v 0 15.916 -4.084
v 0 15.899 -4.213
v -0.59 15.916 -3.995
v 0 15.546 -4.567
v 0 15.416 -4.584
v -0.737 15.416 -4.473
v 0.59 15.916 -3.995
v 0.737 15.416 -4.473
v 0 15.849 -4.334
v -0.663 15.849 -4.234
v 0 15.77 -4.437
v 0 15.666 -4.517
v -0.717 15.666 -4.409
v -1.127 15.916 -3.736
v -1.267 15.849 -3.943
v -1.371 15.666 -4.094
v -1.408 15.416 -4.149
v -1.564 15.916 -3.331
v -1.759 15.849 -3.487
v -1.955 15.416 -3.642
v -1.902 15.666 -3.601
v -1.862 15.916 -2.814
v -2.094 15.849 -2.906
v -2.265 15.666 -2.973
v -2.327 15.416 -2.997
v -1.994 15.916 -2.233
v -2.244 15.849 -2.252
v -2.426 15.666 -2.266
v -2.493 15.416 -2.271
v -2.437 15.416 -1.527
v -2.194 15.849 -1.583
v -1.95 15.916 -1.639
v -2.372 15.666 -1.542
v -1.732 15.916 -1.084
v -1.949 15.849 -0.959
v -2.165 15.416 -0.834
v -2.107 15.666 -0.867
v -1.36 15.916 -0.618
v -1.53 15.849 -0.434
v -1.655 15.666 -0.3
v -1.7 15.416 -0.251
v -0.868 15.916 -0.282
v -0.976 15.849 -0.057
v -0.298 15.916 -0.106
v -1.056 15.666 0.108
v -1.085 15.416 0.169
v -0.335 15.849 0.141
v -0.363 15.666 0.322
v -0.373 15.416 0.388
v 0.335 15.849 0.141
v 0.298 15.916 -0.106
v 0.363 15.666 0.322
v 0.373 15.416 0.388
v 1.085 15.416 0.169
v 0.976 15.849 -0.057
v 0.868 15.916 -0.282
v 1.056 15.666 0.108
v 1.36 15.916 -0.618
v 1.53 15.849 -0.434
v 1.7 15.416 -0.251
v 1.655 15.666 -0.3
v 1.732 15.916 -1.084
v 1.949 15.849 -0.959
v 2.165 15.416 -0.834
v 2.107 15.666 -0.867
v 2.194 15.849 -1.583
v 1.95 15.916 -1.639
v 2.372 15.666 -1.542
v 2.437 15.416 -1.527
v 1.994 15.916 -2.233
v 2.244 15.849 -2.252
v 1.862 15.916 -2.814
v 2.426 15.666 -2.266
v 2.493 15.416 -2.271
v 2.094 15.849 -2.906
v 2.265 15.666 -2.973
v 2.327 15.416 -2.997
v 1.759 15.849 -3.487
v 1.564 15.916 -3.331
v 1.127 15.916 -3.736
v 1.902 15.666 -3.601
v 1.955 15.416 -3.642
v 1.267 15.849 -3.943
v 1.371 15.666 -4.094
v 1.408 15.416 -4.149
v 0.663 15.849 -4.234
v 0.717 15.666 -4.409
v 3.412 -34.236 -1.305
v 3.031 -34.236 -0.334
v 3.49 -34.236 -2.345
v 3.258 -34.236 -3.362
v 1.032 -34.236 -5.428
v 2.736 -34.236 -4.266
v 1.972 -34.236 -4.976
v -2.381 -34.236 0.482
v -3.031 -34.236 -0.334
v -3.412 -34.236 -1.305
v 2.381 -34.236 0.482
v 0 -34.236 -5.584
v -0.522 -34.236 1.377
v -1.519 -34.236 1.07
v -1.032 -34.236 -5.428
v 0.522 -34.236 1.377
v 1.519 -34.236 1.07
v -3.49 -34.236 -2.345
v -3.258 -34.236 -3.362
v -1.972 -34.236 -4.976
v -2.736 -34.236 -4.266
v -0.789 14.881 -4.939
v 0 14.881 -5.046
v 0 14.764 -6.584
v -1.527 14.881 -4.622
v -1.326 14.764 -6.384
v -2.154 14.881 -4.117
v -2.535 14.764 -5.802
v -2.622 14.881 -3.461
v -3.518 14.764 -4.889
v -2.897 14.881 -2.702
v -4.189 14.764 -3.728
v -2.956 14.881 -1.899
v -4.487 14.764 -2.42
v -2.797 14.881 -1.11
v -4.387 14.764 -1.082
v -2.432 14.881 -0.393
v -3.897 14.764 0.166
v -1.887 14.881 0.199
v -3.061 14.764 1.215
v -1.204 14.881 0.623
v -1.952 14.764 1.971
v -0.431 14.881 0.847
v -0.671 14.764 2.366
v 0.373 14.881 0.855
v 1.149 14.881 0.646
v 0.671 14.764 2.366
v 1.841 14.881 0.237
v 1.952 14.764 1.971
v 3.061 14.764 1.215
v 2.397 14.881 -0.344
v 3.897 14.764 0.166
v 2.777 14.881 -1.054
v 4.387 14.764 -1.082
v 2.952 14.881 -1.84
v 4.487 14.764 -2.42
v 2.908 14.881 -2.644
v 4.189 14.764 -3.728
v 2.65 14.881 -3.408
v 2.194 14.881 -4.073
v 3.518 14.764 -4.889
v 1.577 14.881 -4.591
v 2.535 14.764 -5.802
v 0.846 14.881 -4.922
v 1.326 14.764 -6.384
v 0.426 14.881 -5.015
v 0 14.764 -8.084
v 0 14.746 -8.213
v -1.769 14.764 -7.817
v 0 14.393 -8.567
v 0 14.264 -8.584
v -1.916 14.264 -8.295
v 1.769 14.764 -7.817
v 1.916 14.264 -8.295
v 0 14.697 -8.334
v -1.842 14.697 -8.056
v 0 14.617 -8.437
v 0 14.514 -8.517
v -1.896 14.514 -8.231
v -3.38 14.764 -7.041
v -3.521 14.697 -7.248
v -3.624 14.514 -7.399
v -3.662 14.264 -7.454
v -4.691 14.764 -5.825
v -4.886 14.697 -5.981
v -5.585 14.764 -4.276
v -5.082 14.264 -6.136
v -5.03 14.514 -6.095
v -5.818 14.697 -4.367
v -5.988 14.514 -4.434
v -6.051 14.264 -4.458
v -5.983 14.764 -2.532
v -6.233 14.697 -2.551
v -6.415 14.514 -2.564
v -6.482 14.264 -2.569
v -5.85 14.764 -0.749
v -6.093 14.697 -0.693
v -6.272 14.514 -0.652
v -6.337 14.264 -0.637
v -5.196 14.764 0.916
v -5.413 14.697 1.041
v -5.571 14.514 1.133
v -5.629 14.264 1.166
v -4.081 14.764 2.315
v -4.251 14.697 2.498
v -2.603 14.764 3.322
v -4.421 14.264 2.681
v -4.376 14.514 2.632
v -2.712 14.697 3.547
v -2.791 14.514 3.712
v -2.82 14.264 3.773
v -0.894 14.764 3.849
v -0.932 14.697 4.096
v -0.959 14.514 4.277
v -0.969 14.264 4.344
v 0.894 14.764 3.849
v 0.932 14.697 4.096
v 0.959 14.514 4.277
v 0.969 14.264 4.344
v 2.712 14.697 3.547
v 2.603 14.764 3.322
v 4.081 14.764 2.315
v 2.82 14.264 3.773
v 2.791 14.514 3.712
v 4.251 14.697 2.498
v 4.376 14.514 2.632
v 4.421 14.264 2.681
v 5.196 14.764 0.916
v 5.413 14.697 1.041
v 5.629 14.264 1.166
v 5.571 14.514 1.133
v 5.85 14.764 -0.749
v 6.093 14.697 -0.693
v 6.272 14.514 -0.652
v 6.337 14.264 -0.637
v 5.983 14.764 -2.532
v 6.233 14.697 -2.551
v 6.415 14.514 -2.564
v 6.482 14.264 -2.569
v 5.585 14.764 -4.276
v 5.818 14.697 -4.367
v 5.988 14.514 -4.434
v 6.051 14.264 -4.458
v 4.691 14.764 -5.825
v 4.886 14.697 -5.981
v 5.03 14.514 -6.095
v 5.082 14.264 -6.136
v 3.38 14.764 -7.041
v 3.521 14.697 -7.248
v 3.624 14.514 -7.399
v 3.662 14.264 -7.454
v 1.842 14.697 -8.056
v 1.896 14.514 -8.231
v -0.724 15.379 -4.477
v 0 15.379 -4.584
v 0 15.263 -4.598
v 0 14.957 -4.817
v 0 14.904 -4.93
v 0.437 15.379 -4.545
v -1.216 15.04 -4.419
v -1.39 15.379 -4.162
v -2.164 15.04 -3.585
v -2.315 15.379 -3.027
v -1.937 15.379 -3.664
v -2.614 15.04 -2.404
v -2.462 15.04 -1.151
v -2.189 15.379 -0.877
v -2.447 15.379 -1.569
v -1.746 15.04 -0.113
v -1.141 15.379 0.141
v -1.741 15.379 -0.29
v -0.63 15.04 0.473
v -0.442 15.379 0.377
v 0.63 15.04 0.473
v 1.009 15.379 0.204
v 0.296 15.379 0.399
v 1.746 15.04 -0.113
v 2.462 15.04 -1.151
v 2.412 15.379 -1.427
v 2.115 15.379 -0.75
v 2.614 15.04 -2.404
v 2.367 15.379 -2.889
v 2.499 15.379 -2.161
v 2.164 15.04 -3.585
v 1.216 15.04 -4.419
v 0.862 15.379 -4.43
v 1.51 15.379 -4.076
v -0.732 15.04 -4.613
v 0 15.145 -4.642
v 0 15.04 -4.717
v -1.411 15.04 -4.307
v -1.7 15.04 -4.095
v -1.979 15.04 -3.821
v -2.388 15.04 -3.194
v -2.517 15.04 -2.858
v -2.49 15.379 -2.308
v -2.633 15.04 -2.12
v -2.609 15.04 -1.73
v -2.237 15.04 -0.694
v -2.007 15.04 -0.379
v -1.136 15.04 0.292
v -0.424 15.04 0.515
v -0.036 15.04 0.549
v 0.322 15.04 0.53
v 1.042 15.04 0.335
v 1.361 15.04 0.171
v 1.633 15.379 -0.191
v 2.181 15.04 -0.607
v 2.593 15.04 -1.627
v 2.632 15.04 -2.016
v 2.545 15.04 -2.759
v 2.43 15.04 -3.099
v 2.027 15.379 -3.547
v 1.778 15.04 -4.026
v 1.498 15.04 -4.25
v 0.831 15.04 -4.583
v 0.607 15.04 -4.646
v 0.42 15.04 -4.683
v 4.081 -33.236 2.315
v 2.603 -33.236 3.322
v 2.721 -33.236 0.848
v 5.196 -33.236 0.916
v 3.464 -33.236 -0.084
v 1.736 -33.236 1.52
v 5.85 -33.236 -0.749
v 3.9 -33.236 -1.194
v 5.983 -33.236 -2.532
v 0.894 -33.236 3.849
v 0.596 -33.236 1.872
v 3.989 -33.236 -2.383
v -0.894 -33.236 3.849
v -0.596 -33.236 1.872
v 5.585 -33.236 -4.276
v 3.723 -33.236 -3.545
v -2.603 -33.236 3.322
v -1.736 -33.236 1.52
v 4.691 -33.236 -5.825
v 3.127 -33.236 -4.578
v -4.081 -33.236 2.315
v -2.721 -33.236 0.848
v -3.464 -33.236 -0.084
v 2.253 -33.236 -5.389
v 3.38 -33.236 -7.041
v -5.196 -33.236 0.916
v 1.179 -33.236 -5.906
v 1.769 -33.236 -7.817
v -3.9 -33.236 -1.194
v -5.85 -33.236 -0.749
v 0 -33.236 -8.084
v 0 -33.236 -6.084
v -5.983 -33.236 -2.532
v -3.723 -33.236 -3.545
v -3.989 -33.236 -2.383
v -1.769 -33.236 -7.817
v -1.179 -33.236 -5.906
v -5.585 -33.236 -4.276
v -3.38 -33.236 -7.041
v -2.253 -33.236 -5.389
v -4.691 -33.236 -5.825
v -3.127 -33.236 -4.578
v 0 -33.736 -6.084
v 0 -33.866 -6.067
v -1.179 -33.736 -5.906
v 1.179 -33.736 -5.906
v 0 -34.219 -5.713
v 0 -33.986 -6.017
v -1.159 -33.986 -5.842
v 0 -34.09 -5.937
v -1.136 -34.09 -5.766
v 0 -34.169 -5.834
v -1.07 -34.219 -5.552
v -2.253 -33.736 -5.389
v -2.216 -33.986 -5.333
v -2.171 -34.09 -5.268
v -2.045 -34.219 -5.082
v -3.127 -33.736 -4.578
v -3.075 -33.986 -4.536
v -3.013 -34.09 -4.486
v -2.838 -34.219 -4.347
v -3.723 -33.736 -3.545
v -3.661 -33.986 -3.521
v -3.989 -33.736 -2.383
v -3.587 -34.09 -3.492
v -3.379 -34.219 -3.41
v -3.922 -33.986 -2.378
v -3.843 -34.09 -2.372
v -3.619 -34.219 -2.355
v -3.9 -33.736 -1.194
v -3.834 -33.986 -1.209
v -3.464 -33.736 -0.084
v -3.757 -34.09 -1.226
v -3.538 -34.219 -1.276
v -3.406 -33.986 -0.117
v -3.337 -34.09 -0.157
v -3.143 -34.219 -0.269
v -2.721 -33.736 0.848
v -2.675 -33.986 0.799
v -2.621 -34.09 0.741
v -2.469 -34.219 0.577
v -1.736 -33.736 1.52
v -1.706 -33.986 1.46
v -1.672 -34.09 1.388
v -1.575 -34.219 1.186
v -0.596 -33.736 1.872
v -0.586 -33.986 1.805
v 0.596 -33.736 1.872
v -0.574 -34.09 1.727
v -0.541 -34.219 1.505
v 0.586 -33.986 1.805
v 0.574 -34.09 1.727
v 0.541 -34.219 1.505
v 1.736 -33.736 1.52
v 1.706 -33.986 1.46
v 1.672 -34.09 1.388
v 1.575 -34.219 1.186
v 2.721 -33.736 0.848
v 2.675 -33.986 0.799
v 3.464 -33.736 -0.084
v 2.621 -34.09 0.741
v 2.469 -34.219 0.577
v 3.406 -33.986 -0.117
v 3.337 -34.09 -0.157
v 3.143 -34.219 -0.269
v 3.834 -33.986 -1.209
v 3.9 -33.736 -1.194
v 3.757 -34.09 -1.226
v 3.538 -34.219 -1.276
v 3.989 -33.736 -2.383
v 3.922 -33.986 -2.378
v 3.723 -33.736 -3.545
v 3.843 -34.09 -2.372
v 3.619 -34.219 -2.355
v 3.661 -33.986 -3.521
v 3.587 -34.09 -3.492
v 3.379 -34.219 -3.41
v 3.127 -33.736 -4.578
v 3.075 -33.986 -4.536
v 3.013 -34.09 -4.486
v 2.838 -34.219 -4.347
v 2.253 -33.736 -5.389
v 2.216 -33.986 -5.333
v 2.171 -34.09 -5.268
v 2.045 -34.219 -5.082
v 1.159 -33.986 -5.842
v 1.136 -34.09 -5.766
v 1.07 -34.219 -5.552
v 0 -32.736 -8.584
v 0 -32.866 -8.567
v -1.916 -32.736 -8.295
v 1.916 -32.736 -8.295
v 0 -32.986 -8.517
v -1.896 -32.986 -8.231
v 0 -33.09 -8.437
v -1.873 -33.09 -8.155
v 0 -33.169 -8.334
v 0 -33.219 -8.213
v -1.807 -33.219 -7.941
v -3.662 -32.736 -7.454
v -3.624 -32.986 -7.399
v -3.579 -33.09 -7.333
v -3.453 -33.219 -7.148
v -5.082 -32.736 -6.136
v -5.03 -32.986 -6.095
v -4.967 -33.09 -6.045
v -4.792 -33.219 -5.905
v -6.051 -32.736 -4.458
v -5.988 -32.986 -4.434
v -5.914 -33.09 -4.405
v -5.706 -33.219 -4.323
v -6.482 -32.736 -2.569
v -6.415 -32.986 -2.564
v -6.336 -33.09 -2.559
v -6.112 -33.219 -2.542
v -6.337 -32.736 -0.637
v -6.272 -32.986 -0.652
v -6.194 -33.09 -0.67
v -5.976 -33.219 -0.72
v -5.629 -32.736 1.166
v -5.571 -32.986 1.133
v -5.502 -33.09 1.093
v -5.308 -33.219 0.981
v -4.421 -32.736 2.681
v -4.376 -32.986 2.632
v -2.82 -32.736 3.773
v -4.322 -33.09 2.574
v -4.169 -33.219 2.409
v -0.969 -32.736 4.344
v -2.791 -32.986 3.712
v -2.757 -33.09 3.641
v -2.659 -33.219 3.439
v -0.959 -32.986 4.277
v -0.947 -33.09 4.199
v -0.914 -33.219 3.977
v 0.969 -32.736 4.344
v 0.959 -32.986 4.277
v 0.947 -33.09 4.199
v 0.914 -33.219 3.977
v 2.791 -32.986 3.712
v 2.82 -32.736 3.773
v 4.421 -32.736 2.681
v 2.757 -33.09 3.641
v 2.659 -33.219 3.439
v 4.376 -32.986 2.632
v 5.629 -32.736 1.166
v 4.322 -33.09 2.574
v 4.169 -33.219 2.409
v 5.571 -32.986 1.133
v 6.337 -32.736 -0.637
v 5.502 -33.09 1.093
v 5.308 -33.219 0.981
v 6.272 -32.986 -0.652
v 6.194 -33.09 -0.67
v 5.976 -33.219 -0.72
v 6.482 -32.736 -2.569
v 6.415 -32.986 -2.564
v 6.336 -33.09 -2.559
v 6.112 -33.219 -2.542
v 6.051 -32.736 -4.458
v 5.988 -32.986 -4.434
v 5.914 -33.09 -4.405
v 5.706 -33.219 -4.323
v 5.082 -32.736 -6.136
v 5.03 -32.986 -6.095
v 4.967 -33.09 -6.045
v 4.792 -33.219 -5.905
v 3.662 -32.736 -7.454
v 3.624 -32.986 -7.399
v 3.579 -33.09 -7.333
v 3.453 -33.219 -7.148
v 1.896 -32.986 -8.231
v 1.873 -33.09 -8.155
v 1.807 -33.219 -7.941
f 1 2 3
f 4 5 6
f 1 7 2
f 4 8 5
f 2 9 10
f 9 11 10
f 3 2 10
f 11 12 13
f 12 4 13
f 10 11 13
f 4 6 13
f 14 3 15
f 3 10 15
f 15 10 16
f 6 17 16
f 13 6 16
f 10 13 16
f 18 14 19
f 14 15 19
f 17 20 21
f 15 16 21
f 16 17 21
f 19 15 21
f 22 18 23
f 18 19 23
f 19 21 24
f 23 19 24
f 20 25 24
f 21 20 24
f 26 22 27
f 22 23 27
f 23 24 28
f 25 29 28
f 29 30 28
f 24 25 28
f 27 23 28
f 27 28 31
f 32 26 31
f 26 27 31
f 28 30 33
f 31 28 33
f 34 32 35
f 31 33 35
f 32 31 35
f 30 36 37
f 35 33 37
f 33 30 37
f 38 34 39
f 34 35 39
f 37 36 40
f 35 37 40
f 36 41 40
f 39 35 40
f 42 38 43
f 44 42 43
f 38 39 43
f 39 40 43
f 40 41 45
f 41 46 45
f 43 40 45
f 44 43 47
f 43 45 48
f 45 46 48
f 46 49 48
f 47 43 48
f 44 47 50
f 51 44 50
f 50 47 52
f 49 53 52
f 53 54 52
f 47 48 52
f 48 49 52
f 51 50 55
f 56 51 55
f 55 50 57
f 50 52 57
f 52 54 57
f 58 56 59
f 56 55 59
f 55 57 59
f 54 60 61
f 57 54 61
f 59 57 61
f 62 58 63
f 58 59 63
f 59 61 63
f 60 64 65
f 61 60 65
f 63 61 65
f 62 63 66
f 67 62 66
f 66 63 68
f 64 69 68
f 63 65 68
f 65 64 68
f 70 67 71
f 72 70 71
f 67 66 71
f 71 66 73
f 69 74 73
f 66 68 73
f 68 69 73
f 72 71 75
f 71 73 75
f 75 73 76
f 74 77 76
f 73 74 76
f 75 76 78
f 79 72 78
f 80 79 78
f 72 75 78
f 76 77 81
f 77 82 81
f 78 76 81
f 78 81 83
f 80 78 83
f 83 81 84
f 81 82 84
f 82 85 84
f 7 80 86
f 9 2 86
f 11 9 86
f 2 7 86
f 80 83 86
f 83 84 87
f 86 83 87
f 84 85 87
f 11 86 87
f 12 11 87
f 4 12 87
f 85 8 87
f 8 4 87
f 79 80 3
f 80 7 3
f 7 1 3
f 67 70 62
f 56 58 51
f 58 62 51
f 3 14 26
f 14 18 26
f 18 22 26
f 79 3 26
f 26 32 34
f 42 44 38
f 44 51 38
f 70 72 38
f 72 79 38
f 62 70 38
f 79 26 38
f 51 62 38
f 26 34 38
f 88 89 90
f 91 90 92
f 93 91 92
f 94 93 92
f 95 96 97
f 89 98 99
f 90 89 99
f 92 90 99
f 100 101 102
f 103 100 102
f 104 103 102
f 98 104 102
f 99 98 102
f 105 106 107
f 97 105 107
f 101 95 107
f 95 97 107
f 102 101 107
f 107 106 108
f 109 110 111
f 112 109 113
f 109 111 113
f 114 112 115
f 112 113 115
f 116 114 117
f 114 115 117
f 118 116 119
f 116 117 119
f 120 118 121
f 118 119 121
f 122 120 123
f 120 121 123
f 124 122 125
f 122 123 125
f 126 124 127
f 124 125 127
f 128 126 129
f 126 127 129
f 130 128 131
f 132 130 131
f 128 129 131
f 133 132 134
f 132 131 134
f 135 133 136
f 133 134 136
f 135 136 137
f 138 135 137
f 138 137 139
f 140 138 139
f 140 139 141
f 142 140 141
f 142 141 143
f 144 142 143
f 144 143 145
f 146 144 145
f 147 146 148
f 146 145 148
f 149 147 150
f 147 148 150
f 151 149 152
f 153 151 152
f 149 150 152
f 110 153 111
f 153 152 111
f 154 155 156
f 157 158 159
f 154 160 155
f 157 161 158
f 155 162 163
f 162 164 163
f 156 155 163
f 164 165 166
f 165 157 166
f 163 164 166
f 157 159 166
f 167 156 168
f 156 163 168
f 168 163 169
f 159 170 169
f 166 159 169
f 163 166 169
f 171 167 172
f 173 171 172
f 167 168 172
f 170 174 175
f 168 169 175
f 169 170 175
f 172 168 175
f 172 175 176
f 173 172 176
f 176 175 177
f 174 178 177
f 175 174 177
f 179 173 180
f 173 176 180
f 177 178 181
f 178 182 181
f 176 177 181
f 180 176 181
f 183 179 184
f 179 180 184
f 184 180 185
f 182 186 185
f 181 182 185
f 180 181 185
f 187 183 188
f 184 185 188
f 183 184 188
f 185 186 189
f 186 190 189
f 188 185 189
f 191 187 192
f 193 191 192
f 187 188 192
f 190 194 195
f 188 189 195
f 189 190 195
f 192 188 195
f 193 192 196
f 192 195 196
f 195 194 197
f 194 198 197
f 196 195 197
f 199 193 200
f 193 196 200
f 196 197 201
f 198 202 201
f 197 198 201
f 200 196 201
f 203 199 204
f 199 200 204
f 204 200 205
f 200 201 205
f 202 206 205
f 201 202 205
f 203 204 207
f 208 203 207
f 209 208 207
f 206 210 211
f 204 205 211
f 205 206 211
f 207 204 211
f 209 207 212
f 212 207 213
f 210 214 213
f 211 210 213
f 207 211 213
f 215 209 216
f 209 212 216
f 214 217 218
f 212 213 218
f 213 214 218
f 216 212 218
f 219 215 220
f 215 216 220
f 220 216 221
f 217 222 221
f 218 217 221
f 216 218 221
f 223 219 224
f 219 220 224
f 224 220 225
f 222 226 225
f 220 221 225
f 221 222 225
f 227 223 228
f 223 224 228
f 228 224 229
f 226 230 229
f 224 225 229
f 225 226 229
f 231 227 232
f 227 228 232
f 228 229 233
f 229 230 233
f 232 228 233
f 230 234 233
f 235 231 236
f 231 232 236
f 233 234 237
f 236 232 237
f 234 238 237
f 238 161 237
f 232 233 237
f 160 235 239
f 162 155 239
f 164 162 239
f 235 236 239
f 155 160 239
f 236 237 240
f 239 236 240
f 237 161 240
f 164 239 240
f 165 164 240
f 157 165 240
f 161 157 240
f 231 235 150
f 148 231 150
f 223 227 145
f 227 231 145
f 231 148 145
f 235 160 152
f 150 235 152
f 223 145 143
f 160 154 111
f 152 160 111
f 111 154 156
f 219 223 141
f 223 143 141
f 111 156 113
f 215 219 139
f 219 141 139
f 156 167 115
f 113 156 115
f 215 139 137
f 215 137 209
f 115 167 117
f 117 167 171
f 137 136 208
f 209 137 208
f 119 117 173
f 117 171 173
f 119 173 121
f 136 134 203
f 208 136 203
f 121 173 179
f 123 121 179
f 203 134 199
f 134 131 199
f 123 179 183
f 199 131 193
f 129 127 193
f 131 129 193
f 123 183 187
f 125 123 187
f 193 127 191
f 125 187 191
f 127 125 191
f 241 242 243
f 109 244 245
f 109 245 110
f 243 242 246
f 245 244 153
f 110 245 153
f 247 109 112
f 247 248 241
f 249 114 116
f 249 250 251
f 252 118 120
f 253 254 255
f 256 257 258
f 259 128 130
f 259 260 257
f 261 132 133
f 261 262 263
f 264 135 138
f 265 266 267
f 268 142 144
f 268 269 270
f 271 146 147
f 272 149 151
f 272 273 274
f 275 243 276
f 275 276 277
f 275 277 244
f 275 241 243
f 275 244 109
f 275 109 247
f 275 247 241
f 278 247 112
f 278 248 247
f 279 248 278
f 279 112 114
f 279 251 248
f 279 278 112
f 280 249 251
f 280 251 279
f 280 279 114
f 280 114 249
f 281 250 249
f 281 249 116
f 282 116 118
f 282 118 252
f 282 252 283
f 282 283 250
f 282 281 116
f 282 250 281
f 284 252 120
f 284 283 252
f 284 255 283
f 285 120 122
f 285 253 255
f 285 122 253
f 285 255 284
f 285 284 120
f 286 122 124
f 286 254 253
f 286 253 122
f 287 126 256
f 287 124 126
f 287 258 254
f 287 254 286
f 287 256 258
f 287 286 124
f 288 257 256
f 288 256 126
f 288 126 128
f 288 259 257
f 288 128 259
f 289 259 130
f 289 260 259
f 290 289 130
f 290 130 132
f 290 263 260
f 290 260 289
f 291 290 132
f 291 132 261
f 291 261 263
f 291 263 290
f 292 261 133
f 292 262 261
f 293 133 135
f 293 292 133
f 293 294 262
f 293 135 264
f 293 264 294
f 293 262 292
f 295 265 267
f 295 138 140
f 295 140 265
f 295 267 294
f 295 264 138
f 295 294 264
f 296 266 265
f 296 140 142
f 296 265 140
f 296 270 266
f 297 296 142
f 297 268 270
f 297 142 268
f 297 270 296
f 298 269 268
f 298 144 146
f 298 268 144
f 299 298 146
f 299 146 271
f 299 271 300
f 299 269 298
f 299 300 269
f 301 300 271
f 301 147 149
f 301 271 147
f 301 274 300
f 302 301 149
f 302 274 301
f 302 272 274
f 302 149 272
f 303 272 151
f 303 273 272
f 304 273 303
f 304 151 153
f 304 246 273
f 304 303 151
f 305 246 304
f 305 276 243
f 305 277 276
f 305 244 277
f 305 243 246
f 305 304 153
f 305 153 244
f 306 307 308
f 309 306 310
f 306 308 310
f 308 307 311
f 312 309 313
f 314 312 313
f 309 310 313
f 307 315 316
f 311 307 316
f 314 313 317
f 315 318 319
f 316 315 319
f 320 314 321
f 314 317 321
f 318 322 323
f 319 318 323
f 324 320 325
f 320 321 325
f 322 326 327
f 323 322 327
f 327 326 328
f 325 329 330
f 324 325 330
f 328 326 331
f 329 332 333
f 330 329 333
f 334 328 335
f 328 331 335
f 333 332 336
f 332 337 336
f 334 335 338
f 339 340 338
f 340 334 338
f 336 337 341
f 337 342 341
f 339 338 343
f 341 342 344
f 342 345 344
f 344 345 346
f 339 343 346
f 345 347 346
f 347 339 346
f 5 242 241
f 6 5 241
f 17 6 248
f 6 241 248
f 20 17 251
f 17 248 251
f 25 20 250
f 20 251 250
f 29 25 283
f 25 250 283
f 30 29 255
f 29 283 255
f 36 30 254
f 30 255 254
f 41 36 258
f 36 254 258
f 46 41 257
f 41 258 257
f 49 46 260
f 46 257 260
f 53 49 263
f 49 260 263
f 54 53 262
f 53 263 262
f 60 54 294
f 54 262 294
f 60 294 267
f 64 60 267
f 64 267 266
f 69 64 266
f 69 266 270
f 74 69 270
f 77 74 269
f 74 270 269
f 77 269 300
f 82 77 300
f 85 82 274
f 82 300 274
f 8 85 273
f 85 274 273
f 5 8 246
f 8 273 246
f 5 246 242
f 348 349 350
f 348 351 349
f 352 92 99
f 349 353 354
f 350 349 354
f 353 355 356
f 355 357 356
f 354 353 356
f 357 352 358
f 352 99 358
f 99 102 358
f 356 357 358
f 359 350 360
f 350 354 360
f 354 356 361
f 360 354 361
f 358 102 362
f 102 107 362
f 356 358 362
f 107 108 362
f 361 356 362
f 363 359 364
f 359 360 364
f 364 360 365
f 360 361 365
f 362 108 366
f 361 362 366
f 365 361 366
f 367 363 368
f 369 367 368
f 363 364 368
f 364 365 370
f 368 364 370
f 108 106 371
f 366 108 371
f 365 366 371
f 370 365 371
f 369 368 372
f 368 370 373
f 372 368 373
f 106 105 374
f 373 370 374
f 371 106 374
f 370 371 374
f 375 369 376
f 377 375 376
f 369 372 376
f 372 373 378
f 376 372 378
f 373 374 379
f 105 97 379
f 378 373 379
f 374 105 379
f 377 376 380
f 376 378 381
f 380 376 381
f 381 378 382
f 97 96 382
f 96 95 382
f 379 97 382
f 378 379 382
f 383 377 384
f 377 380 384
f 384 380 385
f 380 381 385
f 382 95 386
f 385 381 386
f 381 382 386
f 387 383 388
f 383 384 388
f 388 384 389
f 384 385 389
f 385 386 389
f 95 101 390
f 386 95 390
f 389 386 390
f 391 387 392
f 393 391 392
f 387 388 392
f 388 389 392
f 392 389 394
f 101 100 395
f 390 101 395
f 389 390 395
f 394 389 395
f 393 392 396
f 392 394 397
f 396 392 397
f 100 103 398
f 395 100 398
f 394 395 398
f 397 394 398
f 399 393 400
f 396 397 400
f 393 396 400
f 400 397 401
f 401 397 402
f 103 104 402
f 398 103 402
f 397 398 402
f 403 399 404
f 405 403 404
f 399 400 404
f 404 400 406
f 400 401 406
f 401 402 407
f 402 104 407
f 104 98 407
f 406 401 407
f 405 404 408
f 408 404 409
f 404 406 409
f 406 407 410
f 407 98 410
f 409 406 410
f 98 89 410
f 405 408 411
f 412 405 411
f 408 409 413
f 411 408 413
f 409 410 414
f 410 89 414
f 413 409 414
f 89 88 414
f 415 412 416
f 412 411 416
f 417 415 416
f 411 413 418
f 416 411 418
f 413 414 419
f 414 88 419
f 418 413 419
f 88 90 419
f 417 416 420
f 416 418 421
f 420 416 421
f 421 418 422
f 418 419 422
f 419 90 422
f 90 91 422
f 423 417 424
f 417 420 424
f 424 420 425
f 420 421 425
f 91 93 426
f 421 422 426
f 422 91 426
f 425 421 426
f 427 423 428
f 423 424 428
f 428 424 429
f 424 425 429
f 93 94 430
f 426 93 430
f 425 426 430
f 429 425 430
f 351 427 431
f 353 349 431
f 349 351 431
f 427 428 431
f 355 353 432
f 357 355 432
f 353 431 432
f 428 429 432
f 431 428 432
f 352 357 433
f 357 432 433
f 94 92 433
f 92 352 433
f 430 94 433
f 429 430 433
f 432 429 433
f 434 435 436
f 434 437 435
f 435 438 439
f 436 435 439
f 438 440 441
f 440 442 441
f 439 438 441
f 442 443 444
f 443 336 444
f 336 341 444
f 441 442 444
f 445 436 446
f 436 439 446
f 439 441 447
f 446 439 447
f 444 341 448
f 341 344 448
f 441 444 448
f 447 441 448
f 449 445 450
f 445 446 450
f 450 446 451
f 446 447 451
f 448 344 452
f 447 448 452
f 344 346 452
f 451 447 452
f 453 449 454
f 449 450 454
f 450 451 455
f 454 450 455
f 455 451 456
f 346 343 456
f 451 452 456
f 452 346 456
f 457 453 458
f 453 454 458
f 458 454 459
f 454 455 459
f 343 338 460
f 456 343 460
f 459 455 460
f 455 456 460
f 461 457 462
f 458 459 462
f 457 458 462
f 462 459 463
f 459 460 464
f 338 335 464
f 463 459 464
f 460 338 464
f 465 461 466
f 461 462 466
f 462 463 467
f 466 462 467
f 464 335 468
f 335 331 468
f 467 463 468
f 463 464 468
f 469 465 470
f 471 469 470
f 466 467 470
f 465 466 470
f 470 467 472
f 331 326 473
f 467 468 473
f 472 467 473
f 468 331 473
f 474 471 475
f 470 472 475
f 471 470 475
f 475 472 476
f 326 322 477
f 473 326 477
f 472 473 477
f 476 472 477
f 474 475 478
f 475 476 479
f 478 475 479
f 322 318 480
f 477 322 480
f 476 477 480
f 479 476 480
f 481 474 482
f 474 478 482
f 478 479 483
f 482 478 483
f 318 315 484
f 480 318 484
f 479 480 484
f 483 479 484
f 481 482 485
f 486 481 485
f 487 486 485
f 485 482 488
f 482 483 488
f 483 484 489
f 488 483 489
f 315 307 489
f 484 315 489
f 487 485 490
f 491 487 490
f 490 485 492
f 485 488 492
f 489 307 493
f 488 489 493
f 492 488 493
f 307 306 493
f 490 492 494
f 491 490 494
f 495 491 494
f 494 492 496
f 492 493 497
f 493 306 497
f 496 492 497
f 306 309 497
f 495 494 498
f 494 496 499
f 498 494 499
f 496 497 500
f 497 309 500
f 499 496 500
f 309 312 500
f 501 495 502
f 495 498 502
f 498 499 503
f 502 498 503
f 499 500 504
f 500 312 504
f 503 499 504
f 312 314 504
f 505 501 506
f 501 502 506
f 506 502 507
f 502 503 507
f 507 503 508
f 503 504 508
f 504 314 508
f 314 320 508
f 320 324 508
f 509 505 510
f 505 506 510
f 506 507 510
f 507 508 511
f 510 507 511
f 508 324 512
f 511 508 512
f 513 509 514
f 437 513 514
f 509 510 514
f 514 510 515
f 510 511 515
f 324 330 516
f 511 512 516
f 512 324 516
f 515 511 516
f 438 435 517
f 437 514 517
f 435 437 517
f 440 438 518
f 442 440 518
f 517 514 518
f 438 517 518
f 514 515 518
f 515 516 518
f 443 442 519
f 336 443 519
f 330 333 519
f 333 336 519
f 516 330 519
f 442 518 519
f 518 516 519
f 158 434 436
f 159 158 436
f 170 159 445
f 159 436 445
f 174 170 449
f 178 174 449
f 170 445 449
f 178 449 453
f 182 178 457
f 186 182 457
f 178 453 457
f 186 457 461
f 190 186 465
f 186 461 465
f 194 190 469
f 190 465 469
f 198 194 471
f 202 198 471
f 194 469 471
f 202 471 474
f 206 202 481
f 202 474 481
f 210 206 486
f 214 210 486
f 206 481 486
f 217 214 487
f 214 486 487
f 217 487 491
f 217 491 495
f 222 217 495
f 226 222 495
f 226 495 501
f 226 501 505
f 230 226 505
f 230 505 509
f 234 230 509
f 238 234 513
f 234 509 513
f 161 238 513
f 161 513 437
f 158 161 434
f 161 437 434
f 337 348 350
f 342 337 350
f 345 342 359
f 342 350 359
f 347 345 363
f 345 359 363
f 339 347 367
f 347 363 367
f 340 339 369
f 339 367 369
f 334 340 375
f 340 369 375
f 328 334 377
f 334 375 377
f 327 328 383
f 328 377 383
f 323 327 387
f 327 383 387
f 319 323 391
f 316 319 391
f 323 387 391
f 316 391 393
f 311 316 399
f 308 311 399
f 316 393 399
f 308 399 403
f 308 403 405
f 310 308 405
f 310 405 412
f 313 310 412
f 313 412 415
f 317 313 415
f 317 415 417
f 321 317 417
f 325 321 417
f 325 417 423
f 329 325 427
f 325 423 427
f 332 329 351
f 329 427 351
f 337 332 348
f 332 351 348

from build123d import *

# Parameters (mm, degrees)
REDONDEO1_R = 0.5


with BuildPart() as part:
    # Croquis2 → Revolución1 (revolve)
    with BuildSketch(Plane(origin=(0, 0, 0), x_dir=(0, 0, -1), z_dir=(1, 0, 0))):
        Polygon((2.083734943, 15.916127666), (4.583734943, 15.916127666), (4.583734943, 14.916127666), (6.583734943, 14.763533095), (8.583734943, 14.763533095), (8.583734943, -33.236466905), (6.083734943, -33.236466905), (6.083734943, -34.236466905), (2.083734943, -34.236466905), align=None)
    revolve(axis=Axis((0, -34.236466905, -2.083734943), (0, 1, 0)))

    # Redondeo1
    redondeo1_edges = [part.edges().sort_by_distance(p)[0] for p in [
        (0, -34.236466905, 1.916265057),
        (0, -33.236466905, 4.416265057),
        (0, 14.763533095, 4.416265057),
        (0, 14.916127666, 0.416265057),
        (0, 15.916127666, 0.416265057),
    ]]
    fillet(redondeo1_edges, radius=REDONDEO1_R)


solid = part.part
